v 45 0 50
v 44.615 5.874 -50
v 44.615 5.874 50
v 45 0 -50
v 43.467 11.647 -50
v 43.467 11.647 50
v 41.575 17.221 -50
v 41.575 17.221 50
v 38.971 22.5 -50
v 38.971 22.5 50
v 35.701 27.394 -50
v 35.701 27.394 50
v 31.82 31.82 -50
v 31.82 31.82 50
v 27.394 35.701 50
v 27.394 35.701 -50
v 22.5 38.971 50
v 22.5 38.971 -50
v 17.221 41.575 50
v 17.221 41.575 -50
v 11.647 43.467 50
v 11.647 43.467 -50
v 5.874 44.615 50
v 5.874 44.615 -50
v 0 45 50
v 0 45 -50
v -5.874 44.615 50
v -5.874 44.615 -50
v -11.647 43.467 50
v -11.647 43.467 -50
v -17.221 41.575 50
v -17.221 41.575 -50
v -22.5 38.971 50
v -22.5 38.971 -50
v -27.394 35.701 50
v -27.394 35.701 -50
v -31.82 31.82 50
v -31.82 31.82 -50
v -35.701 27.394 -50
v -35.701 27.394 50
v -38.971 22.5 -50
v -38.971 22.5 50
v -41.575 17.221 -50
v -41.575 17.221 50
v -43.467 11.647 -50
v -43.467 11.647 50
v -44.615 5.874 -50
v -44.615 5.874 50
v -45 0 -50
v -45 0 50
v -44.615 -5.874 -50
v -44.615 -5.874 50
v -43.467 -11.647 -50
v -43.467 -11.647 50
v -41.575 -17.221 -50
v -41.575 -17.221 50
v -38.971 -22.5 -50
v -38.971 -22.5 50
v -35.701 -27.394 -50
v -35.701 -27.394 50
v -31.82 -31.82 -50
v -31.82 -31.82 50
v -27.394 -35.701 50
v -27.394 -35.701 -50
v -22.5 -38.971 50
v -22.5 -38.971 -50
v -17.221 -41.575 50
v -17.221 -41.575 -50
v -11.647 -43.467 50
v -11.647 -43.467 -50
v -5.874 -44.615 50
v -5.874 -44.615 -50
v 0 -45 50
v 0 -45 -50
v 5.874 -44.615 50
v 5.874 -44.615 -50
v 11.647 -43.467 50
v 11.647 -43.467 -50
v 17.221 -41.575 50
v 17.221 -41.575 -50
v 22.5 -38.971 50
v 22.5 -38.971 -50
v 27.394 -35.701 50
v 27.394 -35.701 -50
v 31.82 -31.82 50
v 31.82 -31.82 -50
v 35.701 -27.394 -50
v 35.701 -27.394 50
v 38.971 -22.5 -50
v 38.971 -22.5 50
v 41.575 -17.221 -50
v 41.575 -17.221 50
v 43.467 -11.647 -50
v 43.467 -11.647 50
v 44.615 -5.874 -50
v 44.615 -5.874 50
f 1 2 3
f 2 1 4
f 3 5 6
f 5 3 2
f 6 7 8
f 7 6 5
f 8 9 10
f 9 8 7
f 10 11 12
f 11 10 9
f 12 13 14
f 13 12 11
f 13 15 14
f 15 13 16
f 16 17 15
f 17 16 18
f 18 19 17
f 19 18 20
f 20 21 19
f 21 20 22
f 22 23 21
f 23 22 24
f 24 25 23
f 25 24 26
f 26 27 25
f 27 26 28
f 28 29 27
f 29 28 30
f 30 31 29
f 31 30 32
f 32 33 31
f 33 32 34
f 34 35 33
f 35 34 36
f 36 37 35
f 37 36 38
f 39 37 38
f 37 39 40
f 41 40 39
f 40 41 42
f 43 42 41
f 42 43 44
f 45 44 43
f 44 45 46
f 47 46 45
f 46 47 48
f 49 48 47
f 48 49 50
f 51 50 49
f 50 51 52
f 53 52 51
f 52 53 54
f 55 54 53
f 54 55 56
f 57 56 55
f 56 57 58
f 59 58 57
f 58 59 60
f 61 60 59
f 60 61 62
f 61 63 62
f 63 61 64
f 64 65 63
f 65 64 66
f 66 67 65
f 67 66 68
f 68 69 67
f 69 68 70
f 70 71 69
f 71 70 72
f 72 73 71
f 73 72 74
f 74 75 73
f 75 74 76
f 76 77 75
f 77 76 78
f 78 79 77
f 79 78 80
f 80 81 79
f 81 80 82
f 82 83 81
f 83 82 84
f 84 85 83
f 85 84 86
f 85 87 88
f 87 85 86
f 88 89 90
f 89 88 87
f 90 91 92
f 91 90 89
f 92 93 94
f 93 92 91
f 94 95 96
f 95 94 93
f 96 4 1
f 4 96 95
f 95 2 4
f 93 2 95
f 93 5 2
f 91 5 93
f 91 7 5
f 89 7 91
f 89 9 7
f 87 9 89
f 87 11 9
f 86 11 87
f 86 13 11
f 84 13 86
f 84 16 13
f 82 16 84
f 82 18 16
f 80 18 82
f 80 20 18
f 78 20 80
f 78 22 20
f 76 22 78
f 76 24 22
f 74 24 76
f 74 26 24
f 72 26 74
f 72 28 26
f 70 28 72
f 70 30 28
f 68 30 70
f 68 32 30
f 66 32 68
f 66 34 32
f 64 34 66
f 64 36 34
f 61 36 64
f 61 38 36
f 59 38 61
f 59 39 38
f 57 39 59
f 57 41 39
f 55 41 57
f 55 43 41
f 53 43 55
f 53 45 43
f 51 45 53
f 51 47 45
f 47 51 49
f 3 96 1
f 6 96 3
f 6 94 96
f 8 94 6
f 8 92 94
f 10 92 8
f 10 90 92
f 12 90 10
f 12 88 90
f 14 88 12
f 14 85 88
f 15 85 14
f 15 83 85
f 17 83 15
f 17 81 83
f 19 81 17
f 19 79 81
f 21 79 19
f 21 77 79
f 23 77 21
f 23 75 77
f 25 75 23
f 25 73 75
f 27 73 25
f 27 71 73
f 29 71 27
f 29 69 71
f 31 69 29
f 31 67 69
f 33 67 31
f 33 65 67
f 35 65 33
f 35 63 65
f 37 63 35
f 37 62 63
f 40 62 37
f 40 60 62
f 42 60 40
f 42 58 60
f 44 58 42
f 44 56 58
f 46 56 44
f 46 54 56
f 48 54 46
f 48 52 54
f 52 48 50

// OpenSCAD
// ========================================
// a cylinder with radius 4.5 cm and height 10 cm
// NeuroCAD canonical IR; dimensions are millimetres
// ========================================
$fn = 48;

cylinder(r=45, h=100, center=true);
